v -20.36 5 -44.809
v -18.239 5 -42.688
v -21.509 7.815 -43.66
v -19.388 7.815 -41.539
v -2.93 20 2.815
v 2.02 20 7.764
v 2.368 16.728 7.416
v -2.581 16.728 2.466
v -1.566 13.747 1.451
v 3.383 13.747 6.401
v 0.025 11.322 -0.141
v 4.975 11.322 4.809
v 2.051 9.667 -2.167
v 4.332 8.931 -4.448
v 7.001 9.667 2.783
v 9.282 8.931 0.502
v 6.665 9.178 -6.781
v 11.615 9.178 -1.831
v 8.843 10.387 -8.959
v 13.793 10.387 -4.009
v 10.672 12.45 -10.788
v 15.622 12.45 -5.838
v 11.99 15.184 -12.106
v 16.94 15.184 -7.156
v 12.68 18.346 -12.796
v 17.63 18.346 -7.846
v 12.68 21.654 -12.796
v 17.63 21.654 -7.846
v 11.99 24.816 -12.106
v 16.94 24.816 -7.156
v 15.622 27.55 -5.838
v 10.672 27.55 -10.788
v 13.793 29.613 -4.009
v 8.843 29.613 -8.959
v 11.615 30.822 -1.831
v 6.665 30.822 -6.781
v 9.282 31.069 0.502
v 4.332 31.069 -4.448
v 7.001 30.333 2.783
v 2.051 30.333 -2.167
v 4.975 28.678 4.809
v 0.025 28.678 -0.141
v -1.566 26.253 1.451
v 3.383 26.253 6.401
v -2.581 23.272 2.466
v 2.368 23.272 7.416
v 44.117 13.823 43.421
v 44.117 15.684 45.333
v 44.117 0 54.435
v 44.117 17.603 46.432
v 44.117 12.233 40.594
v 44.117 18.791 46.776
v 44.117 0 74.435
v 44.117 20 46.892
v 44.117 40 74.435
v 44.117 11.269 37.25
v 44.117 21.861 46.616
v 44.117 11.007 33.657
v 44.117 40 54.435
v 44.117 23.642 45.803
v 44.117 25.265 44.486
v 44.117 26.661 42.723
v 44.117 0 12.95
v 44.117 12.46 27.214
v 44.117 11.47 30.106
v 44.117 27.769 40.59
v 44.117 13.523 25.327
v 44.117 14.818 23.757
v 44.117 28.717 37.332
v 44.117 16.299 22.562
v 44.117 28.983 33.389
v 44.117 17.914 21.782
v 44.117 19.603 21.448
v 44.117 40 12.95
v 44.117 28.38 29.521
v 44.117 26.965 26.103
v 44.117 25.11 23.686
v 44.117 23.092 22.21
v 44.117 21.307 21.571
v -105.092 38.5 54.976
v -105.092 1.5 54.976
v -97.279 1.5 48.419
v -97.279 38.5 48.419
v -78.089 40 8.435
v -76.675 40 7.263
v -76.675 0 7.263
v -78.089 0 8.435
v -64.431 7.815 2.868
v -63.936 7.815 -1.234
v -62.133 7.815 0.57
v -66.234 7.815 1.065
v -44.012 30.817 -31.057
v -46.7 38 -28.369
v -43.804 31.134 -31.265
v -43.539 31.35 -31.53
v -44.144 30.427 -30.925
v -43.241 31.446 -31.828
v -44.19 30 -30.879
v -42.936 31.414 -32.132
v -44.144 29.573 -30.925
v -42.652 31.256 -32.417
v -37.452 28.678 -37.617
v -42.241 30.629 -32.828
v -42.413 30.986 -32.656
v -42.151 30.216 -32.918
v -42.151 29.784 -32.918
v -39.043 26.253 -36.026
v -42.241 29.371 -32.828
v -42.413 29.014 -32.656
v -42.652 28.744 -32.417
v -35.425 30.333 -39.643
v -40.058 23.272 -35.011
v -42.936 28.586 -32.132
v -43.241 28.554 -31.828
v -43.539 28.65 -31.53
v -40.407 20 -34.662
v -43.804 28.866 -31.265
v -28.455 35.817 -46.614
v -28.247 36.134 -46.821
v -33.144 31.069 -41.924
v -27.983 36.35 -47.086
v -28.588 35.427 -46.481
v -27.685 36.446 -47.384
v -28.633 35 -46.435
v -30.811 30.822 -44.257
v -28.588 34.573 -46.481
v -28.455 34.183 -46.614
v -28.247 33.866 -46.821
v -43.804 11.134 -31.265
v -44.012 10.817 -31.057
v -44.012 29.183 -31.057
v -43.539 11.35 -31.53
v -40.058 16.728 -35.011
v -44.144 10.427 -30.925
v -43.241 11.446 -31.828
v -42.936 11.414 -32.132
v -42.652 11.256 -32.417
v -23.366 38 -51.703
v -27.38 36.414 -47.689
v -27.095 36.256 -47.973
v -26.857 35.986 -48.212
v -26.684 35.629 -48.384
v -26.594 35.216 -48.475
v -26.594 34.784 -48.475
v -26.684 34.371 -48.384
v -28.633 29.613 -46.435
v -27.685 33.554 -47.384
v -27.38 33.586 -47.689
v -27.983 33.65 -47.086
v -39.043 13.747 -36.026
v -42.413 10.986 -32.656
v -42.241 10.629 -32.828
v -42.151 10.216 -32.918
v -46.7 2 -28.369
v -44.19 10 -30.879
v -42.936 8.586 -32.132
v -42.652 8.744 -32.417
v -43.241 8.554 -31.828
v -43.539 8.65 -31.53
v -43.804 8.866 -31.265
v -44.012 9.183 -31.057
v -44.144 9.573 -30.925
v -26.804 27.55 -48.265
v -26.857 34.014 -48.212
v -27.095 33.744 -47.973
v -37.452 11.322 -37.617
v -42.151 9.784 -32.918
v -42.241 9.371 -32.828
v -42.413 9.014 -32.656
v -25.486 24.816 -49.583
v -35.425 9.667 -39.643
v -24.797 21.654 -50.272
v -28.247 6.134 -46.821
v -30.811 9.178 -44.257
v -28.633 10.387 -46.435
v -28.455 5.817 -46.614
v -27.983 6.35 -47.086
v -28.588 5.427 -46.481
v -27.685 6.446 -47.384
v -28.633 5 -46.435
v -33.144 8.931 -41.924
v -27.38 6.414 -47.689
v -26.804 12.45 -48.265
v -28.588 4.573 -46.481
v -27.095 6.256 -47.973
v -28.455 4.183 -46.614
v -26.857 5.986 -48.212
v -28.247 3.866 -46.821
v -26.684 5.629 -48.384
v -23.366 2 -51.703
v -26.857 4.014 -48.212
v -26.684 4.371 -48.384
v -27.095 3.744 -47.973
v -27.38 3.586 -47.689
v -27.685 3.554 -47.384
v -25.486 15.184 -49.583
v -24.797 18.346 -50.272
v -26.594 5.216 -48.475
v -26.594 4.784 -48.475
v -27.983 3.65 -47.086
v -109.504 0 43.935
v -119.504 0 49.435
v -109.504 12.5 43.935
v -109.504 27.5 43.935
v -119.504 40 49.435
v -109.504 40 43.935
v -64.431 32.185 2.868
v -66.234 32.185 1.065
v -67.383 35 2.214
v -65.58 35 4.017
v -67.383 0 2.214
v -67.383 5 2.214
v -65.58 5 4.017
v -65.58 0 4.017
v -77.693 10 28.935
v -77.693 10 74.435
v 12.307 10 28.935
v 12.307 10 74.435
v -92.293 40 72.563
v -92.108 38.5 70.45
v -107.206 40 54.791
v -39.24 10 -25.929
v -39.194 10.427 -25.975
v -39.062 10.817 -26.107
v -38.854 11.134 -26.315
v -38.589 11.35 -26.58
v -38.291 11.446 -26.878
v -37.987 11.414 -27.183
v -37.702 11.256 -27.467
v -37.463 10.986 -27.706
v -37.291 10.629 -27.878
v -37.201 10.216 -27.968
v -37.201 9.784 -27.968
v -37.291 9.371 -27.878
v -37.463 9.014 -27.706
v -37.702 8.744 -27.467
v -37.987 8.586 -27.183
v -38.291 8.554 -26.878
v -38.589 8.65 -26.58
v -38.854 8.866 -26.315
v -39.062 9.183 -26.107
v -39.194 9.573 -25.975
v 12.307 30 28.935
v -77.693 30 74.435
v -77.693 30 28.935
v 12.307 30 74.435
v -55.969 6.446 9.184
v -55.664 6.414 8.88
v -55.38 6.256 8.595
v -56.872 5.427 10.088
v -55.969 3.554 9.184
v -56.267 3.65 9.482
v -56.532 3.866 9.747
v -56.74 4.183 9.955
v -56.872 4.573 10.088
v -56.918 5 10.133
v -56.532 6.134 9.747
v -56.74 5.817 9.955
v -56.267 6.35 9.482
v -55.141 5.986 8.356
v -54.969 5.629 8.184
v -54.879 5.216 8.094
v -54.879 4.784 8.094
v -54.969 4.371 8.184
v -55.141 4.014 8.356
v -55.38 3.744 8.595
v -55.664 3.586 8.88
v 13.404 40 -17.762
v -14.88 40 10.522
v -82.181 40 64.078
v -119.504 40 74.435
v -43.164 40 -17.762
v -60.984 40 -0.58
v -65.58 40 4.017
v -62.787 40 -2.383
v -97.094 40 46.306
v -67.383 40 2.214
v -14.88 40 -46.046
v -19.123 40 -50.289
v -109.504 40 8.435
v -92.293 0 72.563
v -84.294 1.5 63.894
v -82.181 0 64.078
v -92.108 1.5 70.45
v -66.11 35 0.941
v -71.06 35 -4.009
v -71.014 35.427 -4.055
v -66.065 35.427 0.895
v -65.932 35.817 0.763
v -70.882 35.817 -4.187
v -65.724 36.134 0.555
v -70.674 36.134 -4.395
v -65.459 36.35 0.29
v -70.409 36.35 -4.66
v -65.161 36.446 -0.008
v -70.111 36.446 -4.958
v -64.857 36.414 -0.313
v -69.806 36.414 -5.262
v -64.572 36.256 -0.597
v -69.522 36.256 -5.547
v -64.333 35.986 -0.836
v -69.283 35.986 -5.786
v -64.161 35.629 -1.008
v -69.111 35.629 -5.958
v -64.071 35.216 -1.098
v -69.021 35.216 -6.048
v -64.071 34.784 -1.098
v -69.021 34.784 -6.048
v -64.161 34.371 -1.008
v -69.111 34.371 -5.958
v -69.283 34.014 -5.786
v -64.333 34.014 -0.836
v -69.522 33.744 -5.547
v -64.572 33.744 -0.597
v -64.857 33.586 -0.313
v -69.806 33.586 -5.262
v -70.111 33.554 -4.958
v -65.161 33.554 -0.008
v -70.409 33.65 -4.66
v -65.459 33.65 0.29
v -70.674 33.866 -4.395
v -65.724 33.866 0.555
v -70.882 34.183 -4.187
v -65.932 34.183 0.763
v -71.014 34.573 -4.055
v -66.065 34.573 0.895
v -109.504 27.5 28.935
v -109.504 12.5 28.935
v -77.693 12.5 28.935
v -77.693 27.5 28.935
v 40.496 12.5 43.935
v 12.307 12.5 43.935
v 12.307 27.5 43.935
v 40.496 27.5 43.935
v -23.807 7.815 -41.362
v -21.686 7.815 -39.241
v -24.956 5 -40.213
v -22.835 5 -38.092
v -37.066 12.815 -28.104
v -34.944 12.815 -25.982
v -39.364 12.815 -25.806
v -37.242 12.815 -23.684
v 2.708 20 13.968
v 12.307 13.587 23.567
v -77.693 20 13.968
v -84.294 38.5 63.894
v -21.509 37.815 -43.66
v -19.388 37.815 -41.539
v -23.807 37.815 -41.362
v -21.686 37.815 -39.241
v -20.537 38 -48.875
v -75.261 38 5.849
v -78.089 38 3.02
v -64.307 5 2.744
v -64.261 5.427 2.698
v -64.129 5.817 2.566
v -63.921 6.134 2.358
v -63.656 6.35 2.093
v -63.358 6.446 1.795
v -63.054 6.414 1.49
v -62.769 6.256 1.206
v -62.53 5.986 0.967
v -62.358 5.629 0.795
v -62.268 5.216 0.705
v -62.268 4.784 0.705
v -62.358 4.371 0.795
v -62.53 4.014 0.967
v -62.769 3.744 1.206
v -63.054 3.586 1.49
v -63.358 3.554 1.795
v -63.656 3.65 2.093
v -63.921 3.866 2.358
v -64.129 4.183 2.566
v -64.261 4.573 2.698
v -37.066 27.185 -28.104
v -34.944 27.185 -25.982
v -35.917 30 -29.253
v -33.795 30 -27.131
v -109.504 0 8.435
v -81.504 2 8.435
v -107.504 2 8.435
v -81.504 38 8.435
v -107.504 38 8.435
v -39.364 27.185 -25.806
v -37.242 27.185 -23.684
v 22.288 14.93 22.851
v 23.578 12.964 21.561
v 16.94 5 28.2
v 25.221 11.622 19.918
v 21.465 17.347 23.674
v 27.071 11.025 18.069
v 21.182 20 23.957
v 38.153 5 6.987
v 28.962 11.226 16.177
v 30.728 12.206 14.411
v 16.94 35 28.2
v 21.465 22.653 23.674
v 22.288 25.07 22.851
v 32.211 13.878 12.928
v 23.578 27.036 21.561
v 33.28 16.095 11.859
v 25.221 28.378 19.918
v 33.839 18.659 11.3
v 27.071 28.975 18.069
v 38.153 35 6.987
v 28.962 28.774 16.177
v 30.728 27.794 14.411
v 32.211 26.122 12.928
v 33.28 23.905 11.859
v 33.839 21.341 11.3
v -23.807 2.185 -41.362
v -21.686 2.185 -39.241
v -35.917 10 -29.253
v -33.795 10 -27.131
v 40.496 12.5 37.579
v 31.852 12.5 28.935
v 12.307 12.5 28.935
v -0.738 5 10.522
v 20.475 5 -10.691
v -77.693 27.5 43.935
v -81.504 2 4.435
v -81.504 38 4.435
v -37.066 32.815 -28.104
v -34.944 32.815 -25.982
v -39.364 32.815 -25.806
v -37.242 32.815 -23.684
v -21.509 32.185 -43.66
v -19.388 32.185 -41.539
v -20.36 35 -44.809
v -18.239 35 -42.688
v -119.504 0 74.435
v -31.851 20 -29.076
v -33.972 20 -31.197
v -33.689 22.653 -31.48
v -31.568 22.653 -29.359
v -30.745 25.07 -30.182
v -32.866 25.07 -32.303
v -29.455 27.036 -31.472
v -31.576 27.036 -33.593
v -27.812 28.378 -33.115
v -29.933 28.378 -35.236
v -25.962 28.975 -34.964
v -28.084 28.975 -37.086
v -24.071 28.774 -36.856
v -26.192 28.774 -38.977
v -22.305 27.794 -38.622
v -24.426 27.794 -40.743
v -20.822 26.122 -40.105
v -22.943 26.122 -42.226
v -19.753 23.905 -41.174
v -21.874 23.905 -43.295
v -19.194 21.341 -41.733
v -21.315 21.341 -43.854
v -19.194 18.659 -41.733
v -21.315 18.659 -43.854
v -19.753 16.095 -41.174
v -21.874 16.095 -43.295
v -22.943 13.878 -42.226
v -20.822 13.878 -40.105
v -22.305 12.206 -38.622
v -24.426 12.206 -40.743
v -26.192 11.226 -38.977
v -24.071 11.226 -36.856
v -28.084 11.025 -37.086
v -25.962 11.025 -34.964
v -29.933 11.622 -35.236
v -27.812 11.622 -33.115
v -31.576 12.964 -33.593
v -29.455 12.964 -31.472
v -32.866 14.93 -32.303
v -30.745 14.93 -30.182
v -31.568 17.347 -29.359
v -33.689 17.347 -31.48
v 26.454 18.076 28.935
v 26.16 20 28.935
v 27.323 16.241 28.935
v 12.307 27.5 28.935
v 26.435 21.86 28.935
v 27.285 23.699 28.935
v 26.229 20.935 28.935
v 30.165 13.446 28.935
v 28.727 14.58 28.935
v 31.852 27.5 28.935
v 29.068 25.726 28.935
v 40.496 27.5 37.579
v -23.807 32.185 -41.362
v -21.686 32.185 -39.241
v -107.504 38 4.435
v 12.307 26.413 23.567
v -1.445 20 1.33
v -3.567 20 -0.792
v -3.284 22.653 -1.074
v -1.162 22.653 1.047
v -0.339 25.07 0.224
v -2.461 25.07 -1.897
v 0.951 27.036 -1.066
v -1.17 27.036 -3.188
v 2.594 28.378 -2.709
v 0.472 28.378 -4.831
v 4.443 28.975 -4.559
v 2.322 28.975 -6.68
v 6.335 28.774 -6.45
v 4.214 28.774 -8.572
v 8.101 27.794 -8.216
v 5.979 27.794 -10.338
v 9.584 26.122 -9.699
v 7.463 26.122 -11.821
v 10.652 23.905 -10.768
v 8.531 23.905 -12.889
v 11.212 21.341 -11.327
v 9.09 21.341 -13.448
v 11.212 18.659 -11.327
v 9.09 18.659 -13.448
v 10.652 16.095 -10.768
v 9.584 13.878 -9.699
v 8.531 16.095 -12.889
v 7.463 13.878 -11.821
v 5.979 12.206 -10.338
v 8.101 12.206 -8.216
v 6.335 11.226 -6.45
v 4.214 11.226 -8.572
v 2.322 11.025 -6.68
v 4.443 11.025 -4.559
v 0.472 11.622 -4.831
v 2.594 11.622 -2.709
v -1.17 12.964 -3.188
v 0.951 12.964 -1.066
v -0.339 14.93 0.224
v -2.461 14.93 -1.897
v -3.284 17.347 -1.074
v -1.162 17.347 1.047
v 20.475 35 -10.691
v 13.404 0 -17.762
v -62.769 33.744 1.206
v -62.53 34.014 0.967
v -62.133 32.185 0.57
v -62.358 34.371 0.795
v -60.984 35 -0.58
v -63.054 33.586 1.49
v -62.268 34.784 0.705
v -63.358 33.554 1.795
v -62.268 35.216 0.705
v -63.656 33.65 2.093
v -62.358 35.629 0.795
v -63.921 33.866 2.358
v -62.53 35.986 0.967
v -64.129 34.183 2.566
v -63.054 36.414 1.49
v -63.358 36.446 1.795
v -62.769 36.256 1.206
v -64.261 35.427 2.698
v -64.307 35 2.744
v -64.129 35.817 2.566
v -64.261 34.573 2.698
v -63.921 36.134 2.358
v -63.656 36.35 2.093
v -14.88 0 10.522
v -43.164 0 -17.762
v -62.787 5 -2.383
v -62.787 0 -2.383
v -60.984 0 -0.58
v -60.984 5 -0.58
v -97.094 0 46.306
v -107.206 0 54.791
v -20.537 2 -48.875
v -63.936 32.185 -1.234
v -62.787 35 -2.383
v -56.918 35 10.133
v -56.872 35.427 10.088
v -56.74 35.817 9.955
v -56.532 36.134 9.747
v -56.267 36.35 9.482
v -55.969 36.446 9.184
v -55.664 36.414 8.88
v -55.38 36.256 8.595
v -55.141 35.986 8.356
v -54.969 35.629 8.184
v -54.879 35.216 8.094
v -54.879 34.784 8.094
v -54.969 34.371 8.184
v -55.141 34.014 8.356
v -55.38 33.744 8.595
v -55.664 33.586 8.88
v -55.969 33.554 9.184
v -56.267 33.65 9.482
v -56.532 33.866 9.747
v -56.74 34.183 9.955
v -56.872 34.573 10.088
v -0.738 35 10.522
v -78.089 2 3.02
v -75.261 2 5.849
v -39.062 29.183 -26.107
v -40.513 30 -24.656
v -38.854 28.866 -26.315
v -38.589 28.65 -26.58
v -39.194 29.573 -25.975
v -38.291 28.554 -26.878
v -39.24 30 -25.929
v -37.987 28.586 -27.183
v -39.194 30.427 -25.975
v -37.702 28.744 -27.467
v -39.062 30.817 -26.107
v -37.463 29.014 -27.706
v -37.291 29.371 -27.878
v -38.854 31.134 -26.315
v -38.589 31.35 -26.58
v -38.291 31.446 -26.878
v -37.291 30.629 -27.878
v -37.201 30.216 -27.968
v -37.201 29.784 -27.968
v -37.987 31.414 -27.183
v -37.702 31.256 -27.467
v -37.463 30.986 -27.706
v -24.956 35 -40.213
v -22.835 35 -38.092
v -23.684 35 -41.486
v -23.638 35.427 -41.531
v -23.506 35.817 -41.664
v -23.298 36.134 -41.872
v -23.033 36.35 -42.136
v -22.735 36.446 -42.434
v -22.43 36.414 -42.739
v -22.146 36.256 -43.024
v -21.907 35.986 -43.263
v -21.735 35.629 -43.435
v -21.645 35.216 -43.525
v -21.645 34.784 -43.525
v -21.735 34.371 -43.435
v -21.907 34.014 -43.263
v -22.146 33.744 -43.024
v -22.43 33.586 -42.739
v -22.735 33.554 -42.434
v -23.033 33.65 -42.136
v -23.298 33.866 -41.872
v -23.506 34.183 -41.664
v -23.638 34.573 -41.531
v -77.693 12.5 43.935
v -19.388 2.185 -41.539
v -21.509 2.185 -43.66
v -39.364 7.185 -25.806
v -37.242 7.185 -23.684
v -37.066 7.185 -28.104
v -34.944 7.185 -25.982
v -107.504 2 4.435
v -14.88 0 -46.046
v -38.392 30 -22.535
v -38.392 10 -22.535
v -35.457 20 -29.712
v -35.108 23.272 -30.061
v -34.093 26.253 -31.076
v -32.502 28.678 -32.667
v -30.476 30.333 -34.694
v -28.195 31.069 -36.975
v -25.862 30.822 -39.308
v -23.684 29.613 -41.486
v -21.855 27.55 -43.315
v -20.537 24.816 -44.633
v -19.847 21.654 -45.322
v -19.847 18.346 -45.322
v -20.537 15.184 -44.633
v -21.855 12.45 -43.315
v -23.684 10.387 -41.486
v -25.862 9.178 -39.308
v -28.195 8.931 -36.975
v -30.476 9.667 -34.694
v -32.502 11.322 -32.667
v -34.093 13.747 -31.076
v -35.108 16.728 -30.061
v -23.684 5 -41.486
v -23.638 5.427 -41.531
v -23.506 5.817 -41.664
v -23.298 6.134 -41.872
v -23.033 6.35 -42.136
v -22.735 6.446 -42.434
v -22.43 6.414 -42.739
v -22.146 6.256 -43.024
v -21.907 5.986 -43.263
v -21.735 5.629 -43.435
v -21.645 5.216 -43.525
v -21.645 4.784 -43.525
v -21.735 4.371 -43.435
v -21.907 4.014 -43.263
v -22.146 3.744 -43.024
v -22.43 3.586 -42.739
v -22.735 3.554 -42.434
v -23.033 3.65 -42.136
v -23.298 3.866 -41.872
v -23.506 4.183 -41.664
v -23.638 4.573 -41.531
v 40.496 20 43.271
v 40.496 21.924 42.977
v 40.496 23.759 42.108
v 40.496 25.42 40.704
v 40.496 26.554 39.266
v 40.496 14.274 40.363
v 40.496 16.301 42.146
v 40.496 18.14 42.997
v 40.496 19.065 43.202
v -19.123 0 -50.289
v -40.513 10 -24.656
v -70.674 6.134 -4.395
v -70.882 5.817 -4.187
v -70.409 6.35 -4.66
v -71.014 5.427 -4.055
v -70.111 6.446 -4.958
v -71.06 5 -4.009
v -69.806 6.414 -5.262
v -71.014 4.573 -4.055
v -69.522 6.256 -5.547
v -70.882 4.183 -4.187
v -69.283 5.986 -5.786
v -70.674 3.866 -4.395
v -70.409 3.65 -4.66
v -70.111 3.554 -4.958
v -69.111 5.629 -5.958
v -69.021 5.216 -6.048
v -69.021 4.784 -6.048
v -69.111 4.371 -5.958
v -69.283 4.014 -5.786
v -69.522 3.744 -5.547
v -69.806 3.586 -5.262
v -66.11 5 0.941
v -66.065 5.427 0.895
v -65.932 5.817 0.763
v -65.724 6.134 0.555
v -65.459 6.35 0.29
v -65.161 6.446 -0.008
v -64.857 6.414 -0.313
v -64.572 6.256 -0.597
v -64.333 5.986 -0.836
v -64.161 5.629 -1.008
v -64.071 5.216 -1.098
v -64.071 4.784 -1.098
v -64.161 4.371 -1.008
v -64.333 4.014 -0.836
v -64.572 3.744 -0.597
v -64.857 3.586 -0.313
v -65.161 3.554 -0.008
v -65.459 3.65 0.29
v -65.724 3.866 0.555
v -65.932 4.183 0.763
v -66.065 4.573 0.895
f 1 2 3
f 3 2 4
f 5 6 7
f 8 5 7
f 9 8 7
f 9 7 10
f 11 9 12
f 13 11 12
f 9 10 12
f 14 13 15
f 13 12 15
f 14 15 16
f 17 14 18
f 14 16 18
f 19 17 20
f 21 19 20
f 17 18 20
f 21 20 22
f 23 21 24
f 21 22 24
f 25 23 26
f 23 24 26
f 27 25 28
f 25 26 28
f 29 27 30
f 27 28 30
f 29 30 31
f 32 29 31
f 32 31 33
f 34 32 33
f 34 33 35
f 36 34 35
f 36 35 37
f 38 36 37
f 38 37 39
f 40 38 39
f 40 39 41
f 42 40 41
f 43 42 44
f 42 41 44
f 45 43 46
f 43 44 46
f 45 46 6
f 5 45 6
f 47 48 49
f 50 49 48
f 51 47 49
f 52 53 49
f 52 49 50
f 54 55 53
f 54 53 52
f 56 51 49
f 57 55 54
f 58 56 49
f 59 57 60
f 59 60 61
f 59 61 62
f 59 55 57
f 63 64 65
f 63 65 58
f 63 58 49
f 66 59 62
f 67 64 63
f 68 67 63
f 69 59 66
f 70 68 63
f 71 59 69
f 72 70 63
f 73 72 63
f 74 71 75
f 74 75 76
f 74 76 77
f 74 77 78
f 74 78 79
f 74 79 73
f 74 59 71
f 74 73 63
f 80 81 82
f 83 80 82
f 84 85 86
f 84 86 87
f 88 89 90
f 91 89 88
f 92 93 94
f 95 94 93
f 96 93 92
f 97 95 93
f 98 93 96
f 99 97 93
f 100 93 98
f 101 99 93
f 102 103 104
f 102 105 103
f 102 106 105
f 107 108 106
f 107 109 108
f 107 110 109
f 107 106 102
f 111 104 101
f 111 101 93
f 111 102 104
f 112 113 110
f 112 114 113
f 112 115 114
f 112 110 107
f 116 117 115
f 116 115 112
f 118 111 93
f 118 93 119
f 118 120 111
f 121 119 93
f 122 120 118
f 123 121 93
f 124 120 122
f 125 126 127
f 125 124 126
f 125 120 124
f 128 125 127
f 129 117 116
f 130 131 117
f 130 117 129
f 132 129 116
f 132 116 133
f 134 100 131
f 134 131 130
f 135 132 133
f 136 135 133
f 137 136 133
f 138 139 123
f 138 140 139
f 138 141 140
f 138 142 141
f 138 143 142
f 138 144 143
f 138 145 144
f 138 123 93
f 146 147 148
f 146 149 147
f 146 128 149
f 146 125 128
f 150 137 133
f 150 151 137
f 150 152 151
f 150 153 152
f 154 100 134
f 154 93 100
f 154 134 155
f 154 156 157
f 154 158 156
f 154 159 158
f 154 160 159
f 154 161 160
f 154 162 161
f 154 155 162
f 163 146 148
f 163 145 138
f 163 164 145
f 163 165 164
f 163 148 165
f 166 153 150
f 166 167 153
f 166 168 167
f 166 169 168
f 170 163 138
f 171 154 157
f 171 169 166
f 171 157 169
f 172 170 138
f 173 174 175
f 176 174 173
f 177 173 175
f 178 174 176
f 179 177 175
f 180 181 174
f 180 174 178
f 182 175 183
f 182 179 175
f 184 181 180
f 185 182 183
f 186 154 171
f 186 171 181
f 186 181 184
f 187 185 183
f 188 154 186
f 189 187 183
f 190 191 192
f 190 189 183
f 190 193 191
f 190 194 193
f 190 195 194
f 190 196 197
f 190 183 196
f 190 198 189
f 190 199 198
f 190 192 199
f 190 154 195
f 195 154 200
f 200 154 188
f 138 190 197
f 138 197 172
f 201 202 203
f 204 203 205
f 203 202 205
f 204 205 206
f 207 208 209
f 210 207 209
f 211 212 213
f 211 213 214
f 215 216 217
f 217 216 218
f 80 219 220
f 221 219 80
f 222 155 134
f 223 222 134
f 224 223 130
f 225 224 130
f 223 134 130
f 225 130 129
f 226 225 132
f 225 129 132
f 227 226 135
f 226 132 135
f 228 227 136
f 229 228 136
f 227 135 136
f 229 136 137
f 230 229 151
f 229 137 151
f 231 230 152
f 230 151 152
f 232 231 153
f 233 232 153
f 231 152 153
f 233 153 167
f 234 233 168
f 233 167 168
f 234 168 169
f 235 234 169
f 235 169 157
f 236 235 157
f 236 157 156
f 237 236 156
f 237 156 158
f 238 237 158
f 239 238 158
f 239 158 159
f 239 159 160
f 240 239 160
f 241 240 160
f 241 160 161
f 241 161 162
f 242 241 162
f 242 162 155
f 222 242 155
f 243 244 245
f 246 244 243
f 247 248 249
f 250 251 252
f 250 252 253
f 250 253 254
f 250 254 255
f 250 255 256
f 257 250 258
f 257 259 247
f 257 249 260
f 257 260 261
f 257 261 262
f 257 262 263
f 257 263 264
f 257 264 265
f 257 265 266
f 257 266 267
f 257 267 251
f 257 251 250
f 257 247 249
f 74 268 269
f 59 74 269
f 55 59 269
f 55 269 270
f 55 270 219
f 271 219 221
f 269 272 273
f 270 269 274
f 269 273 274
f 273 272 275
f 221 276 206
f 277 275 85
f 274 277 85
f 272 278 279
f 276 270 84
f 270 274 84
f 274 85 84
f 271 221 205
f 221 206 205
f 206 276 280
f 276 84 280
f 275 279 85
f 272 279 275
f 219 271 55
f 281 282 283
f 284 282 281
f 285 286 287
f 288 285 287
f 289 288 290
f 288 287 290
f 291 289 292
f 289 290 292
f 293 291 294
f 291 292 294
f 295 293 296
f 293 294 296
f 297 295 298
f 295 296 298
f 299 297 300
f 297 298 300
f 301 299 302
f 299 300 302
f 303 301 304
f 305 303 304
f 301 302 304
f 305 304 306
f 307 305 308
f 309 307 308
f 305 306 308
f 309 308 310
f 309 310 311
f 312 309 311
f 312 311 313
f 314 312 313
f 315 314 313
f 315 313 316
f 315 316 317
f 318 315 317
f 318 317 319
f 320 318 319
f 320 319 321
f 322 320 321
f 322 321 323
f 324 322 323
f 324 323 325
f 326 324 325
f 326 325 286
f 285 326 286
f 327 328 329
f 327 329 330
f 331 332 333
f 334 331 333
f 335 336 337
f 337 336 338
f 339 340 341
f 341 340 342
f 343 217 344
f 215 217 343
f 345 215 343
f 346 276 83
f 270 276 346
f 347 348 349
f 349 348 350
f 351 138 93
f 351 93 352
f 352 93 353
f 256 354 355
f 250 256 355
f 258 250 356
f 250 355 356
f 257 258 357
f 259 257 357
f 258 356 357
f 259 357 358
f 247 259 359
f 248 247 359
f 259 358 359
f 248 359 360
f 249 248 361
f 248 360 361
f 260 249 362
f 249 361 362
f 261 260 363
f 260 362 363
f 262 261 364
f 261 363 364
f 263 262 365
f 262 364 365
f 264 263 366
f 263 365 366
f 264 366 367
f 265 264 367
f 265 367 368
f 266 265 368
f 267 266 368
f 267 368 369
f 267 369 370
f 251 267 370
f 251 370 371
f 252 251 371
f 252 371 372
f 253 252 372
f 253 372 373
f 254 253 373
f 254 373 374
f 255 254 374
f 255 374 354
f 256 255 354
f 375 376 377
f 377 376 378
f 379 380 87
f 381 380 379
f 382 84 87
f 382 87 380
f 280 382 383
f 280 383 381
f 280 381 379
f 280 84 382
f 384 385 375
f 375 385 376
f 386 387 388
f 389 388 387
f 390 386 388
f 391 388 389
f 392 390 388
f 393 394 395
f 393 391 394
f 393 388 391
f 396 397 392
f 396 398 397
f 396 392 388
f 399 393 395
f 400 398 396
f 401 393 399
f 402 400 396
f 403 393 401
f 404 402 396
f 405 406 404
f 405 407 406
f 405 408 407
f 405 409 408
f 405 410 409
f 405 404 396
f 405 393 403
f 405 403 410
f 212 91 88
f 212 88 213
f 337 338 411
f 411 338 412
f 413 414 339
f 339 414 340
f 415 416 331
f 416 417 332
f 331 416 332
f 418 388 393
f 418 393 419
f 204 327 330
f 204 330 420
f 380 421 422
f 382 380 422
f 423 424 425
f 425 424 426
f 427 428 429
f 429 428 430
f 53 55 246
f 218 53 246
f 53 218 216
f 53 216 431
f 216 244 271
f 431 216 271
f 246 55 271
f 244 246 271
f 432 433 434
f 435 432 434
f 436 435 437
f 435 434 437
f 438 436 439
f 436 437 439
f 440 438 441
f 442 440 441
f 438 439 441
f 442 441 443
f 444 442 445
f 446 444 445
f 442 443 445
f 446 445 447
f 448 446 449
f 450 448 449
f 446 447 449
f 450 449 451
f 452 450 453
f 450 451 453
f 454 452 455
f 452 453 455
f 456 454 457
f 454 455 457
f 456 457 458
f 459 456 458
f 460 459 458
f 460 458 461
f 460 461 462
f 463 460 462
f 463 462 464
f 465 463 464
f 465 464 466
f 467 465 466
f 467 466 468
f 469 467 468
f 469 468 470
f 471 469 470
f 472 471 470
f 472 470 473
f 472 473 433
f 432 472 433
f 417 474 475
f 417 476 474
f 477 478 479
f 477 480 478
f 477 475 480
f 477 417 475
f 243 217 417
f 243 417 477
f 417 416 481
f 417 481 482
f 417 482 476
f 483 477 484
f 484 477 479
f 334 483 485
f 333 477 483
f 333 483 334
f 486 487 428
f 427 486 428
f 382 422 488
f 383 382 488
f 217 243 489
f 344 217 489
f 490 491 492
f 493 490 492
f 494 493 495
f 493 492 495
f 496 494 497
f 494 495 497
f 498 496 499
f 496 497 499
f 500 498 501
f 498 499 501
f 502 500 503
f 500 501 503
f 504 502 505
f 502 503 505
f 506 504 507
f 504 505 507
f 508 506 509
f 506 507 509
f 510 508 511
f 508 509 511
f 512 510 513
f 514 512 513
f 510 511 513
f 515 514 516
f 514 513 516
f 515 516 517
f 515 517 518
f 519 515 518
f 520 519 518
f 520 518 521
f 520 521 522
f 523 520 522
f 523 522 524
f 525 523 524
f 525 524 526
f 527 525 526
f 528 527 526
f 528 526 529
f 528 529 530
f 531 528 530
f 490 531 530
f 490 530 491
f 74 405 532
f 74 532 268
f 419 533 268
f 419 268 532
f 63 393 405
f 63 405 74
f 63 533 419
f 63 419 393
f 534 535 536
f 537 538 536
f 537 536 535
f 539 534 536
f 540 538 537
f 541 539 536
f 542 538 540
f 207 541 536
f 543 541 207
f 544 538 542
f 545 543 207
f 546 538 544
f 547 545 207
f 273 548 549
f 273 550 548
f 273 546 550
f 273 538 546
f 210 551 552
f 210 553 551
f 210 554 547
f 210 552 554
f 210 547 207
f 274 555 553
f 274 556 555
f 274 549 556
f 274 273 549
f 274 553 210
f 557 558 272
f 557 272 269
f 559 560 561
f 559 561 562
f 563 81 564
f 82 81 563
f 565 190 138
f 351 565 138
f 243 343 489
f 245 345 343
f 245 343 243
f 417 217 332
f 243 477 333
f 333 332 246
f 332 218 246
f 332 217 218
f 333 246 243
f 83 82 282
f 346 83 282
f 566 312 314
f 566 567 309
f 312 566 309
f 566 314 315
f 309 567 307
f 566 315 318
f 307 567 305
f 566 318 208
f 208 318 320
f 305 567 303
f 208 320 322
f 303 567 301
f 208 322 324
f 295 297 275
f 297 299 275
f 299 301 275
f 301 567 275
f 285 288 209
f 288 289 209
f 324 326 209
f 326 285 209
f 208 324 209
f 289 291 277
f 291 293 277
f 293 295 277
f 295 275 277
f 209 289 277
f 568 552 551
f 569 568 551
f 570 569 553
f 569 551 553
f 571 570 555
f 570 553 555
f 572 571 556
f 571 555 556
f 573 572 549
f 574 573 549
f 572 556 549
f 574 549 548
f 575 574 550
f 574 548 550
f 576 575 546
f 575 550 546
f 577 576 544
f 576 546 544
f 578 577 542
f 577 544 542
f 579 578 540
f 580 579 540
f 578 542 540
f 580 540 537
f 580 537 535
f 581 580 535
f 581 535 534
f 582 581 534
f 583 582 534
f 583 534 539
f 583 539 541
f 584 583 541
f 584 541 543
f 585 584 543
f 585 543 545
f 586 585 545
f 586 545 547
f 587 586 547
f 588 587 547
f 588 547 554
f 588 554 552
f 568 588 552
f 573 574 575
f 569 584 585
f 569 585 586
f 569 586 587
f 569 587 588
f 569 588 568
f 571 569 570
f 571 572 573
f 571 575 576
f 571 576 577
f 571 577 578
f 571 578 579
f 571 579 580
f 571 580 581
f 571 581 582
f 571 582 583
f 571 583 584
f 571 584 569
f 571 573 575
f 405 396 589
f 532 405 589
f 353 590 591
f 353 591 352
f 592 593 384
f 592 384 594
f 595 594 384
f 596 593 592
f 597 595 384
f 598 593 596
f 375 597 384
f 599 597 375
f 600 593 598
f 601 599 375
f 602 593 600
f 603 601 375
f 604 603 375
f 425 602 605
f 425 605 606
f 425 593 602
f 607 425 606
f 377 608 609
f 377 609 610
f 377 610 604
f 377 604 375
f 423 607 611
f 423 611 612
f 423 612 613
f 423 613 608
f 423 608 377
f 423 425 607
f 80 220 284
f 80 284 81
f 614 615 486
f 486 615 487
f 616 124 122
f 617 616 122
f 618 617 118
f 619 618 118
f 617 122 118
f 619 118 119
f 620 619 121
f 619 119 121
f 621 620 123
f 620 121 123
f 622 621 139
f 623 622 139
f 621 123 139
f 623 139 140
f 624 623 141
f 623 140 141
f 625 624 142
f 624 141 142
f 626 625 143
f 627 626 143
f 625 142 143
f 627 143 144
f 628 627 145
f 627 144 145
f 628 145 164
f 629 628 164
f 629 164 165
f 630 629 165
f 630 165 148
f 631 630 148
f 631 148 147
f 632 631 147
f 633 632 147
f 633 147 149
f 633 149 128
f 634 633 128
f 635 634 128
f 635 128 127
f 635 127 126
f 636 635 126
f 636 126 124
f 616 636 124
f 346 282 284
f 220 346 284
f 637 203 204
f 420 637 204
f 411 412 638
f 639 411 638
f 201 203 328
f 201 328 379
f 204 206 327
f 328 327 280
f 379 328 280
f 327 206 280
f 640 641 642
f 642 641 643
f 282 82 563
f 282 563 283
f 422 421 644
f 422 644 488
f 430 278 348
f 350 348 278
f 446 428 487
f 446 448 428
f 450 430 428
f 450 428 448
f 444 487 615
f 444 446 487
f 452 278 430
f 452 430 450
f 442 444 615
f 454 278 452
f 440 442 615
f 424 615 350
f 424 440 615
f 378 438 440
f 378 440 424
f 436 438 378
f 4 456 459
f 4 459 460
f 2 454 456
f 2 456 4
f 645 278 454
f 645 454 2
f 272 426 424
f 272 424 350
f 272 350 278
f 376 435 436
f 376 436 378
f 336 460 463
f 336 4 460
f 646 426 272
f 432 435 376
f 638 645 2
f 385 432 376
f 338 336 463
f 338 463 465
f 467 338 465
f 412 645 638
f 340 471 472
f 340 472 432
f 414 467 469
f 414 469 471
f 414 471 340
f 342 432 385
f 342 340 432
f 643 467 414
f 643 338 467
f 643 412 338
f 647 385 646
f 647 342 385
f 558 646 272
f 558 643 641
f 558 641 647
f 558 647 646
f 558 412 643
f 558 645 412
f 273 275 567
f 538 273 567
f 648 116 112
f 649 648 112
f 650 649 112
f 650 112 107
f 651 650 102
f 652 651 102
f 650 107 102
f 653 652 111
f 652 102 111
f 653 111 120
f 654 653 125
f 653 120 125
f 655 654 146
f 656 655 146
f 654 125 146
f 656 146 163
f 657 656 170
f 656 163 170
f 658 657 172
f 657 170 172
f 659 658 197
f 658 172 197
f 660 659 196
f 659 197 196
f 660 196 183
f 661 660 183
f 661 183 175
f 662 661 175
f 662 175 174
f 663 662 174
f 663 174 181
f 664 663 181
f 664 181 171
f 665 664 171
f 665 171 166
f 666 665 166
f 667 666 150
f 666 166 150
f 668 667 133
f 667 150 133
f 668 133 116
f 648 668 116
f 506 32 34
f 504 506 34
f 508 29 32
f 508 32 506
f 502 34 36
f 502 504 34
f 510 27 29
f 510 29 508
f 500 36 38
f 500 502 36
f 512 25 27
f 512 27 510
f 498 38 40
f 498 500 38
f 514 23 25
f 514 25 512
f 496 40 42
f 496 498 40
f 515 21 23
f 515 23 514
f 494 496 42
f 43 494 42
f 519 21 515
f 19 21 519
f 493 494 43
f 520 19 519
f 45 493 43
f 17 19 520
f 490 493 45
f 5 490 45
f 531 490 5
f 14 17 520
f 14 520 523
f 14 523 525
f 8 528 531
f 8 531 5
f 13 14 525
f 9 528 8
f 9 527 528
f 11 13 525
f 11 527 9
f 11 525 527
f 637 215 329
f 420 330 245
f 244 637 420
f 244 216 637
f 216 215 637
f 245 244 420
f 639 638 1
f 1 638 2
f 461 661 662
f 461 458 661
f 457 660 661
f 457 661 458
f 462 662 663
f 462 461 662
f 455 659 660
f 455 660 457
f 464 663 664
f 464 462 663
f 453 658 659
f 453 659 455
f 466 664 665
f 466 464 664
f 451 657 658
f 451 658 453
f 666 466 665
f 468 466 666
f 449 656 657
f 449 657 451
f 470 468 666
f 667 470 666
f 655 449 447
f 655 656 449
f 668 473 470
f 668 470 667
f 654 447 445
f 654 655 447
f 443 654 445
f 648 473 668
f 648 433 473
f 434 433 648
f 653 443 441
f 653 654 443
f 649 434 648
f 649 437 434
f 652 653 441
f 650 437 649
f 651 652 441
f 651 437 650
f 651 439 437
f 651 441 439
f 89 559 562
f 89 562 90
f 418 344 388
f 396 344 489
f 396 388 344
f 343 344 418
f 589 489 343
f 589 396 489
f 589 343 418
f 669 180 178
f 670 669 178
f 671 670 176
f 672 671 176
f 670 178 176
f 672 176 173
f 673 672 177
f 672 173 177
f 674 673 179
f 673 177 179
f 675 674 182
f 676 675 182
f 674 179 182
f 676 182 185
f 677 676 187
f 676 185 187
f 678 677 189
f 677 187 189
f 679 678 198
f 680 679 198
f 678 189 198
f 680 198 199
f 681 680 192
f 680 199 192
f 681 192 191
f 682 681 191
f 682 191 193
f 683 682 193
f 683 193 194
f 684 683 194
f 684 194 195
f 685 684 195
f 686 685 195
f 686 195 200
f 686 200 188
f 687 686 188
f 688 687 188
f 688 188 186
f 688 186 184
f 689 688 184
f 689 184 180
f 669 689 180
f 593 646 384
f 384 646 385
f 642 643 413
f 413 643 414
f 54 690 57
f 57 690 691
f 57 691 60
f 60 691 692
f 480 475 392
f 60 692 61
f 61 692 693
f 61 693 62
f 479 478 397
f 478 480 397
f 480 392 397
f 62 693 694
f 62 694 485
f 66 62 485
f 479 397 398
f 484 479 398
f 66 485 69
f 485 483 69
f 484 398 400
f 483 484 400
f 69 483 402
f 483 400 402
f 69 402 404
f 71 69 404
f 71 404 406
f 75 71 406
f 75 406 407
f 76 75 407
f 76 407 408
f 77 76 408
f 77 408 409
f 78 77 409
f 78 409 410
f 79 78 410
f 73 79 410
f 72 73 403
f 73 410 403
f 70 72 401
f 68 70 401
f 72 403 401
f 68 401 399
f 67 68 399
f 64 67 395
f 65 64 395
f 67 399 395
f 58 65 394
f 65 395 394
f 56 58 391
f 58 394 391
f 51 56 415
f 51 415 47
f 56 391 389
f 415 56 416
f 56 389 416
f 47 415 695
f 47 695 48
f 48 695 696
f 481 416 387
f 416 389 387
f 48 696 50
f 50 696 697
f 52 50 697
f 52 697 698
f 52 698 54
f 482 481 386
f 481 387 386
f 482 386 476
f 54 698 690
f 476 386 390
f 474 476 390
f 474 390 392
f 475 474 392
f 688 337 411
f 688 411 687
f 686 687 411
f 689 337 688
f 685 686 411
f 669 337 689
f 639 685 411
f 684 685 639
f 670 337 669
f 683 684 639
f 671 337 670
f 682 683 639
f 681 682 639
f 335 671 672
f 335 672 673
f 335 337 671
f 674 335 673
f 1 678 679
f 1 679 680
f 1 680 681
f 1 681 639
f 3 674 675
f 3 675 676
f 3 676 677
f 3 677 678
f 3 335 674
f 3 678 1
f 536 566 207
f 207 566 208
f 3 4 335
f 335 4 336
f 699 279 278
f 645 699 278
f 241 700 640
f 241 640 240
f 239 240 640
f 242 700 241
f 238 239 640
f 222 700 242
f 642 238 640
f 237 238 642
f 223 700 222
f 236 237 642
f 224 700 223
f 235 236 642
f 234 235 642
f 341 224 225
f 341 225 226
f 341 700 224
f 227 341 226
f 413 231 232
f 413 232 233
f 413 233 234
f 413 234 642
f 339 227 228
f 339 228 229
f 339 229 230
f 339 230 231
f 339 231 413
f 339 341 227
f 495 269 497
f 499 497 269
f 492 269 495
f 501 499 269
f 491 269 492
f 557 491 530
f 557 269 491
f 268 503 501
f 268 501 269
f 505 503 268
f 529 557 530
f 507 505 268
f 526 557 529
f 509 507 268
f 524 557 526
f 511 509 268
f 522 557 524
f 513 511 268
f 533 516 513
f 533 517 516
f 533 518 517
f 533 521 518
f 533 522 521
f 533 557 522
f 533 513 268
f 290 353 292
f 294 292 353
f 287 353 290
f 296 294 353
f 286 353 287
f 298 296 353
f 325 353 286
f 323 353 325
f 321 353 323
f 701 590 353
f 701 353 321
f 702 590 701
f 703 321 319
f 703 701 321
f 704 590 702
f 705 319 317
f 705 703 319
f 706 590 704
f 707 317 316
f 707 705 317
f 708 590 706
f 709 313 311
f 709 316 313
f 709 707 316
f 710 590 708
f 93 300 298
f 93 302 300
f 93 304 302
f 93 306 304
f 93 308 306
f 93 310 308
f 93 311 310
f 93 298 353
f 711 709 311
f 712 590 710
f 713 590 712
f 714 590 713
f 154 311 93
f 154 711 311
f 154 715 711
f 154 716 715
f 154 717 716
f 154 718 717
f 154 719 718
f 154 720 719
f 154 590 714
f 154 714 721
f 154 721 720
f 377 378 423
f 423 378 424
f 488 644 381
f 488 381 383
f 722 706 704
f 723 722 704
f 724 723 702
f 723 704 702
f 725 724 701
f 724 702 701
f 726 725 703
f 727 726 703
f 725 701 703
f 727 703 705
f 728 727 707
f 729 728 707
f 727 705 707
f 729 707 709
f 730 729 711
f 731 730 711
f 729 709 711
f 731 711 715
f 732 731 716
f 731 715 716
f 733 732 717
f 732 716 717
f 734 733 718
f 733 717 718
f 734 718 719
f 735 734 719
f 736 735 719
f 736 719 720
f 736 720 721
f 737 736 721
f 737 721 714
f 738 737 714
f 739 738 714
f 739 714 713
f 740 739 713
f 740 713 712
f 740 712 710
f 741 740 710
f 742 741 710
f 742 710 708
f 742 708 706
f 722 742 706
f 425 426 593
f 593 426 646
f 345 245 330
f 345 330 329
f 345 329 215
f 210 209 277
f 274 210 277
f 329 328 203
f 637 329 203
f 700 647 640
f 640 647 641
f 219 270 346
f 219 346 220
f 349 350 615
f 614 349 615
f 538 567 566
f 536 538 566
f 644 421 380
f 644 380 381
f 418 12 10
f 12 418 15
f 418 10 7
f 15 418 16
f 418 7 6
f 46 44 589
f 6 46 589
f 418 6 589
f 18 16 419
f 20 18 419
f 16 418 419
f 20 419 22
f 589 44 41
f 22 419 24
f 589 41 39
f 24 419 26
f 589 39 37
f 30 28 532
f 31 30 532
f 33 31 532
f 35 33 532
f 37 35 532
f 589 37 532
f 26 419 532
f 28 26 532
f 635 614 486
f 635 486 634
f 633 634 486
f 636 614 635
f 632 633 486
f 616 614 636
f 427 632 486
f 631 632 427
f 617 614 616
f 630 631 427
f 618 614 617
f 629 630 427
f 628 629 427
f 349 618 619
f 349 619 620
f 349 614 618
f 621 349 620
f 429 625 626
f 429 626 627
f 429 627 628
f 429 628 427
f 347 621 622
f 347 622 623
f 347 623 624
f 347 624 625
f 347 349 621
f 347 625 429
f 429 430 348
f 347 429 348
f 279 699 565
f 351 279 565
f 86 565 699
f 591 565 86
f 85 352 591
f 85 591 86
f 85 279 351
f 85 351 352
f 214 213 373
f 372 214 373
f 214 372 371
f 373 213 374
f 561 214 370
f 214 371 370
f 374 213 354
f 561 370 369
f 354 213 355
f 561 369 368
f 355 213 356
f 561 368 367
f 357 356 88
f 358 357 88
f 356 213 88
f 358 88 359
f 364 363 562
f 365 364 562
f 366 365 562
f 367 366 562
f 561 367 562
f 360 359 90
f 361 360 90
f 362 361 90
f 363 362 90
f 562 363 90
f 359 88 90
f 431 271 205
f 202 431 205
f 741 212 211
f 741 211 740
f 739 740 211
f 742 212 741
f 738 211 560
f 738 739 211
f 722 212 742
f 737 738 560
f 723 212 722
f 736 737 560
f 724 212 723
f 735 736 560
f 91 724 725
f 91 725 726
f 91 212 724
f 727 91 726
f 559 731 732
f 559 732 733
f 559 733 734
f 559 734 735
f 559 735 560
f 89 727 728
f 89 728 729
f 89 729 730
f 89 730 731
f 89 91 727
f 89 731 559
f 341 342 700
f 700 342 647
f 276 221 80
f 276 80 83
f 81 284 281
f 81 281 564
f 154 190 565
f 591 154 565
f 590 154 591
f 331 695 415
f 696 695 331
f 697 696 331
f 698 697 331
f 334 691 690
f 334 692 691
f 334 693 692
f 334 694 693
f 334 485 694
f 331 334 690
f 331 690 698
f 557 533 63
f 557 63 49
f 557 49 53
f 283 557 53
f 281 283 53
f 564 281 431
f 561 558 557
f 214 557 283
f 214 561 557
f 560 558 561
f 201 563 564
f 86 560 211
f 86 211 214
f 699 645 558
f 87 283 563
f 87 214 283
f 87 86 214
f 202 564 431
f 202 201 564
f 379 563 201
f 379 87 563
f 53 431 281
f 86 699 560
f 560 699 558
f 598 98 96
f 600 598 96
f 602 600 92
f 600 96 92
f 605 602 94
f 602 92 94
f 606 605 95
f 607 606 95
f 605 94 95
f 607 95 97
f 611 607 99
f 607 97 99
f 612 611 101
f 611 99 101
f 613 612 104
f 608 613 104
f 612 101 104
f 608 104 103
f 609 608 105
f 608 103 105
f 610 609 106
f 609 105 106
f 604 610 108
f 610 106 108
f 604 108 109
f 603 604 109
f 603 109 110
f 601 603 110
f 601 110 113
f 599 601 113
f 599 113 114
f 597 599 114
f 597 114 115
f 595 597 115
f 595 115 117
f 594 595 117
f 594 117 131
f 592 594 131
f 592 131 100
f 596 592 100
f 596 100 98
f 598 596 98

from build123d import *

# Parameters (mm, degrees)
BOSS_EXTRUDE1_DEPTH  = 40
SKETCH3_R            = 9
CUT_EXTRUDE1_DEPTH   = 135.350288425
SKETCH4_W            = 25
SKETCH4_H            = 30
CUT_EXTRUDE2_DEPTH   = 30
SKETCH5_R            = 11.1
CUT_EXTRUDE3_DEPTH   = 7
SKETCH6_R            = 11.1
CUT_EXTRUDE4_DEPTH   = 7
CUT_EXTRUDE5_DEPTH   = 41
SKETCH9_W            = 50
SKETCH9_H            = 40
BOSS_EXTRUDE2_DEPTH  = 30
SKETCH11_R           = 1.45
CUT_EXTRUDE8_DEPTH   = 20
SKETCH15_W           = 81.391173049
SKETCH15_H           = 40
SKETCH15_W_2         = 77.391173049
SKETCH15_H_2         = 36
CUT_EXTRUDE9_DEPTH   = 4
SKETCH16_W           = 30
SKETCH16_H           = 40
SKETCH16_W_2         = 26
SKETCH16_H_2         = 36
CUT_EXTRUDE10_DEPTH  = 4
CUT_EXTRUDE11_DEPTH  = 41
SKETCH18_W           = 153.620263659
SKETCH18_H           = 20
BOSS_EXTRUDE3_DEPTH  = 40
CUT_EXTRUDE7_DEPTH   = 41
SKETCH19_W           = 15
SKETCH19_H           = 15
CUT_EXTRUDE12_DEPTH  = 150
SKETCH20_R           = 1.45
CUT_EXTRUDE13_DEPTH  = 20
CUT_EXTRUDE16_DEPTH  = 3
CUT_EXTRUDE18_START  = -7
CUT_EXTRUDE18_DEPTH  = 2.55
SKETCH38_W           = 90
SKETCH38_H           = 20
CUT_EXTRUDE19_DEPTH  = 45.5
CUT_EXTRUDE21_START  = -31.810131
CUT_EXTRUDE21_DEPTH  = 90
BOSS_EXTRUDE11_DEPTH = 40
CHAMFER1_SIZE        = 1.5


with BuildPart() as part:
    # Sketch1 → Boss-Extrude1 (new body)
    with BuildSketch(Plane(origin=(0, 0, 0), x_dir=(1, 0, 0), z_dir=(0, 1, 0))):
        Polygon((-79.503540842, -54.434705768), (-79.503540842, -4.434705768), (-46.700027791, 28.368807283), (-21.951290449, 53.117544624), (-14.880222638, 46.046476813), (-43.164493885, 17.762205565), (-14.880222638, -10.522065682), (13.40404861, 17.762205565), (60.496459158, -29.330204983), (60.496459158, -54.434705768), align=None)
    extrude(amount=BOSS_EXTRUDE1_DEPTH)

    # Sketch3 → Cut-Extrude1 (cut, through all)
    with BuildSketch(Plane(origin=(-37.534417537, 0, -37.534417537), x_dir=(-0.707106781, 0, 0.707106781), z_dir=(-0.707106781, 0, -0.707106781))):
        with Locations((-7.037869671, 20)):
            Circle(SKETCH3_R)
    extrude(amount=-CUT_EXTRUDE1_DEPTH, mode=Mode.SUBTRACT)

    # Sketch4 → Cut-Extrude2 (cut)
    with BuildSketch(Plane(origin=(15.583127088, 0, -15.583127088), x_dir=(-0.707106781, 0, -0.707106781), z_dir=(0.707106781, 0, -0.707106781))):
        with Locations((-19.418317664, 20)):
            Rectangle(SKETCH4_W, SKETCH4_H)
    extrude(amount=-CUT_EXTRUDE2_DEPTH, mode=Mode.SUBTRACT)

    # Sketch5 → Cut-Extrude3 (cut)
    with BuildSketch(Plane(origin=(-37.534417537, 0, -37.534417537), x_dir=(-0.707106781, 0, 0.707106781), z_dir=(-0.707106781, 0, -0.707106781))):
        with Locations((-7.037869671, 20)):
            Circle(SKETCH5_R)
    extrude(amount=-CUT_EXTRUDE3_DEPTH, mode=Mode.SUBTRACT)

    # Sketch6 → Cut-Extrude4 (cut)
    with BuildSketch(Plane(origin=(4.891989334, 0, 4.891989334), x_dir=(0.707106781, 0, -0.707106781), z_dir=(0.707106781, 0, 0.707106781))):
        with Locations(Location((7.037869671, 20, 0), (0, 0, 180))):  # turned: the seam where the file's is
            Circle(SKETCH6_R)
    extrude(amount=-CUT_EXTRUDE4_DEPTH, mode=Mode.SUBTRACT)

    # Sketch7 → Cut-Extrude5 (cut, through all)
    with BuildSketch(Plane(origin=(0, 40, 0), x_dir=(1, 0, 0), z_dir=(0, 1, 0))):
        Polygon((44.116722817, -12.950468642), (44.116722817, -54.434705768), (60.496459158, -54.434705768), (60.496459158, -29.330204983), align=None)
    extrude(amount=-CUT_EXTRUDE5_DEPTH, mode=Mode.SUBTRACT)

    # Sketch9 → Boss-Extrude2 (add)
    with BuildSketch(Plane.ZY.offset(79.503540842)):
        with Locations((29.434705768, 20)):
            Rectangle(SKETCH9_W, SKETCH9_H)
    extrude(amount=BOSS_EXTRUDE2_DEPTH)

    # Sketch11 → Cut-Extrude8 (cut)
    with BuildSketch(Plane(origin=(-37.534417537, 0, -37.534417537), x_dir=(-0.707106781, 0, 0.707106781), z_dir=(-0.707106781, 0, -0.707106781))):
        with Locations((7.962130329, 10)):
            Circle(SKETCH11_R)
        with Locations((7.962130329, 30)):
            Circle(SKETCH11_R)
    extrude(amount=-CUT_EXTRUDE8_DEPTH, mode=Mode.SUBTRACT)

    # Sketch15 → Cut-Extrude9 (cut)
    with BuildSketch(Plane(origin=(-37.534417537, 0, -37.534417537), x_dir=(-0.707106781, 0, 0.707106781), z_dir=(-0.707106781, 0, -0.707106781))):
        with Locations((18.657716854, 20)):
            Rectangle(SKETCH15_W, SKETCH15_H)
        with Locations((18.657716854, 20)):
            Rectangle(SKETCH15_W_2, SKETCH15_H_2, mode=Mode.SUBTRACT)
    extrude(amount=-CUT_EXTRUDE9_DEPTH, mode=Mode.SUBTRACT)

    # Sketch16 → Cut-Extrude10 (cut)
    with BuildSketch(Plane(origin=(0, 0, 4.434705768), x_dir=(-1, 0, 0), z_dir=(0, 0, -1))):
        with Locations((94.503540842, 20)):
            Rectangle(SKETCH16_W, SKETCH16_H)
        with Locations((94.503540842, 20)):
            Rectangle(SKETCH16_W_2, SKETCH16_H_2, mode=Mode.SUBTRACT)
    extrude(amount=-CUT_EXTRUDE10_DEPTH, mode=Mode.SUBTRACT)

    # Sketch17 → Cut-Extrude11 (cut, through all)
    with BuildSketch(Plane.XZ):
        Polygon((-76.675113717, 7.263132892), (-78.089327279, 8.434705768), (-79.503540842, 8.434705768), (-79.503540842, 4.434705768), align=None)
    extrude(amount=-CUT_EXTRUDE11_DEPTH, mode=Mode.SUBTRACT)

    # Sketch18 → Boss-Extrude3 (add)
    with BuildSketch(Plane(origin=(0, 40, 0), x_dir=(1, 0, 0), z_dir=(0, 1, 0))):
        with Locations((-32.693409012, -64.434705768)):
            Rectangle(SKETCH18_W, SKETCH18_H)
    extrude(amount=-BOSS_EXTRUDE3_DEPTH)

    # Sketch10 → Cut-Extrude7 (cut, through all)
    with BuildSketch(Plane(origin=(0, 40, 0), x_dir=(1, 0, 0), z_dir=(0, 1, 0))):
        Polygon((-92.108080814, -70.449971453), (-105.09239053, -54.975873702), (-97.27873721, -48.419440083), (-84.294427494, -63.893537834), align=None)
    extrude(amount=-CUT_EXTRUDE7_DEPTH, mode=Mode.SUBTRACT)

    # Sketch19 → Cut-Extrude12 (cut)
    with BuildSketch(Plane.ZY.offset(109.503540842)):
        with Locations((36.434705768, 20)):
            Rectangle(SKETCH19_W, SKETCH19_H)
    extrude(amount=-CUT_EXTRUDE12_DEPTH, mode=Mode.SUBTRACT)

    # Sketch20 → Cut-Extrude13 (cut)
    with BuildSketch(Plane(origin=(-37.534417537, 0, -37.534417537), x_dir=(-0.707106781, 0, 0.707106781), z_dir=(-0.707106781, 0, -0.707106781))):
        with Locations((45.962130329, 5)):
            Circle(SKETCH20_R)
        with Locations((45.962130329, 35)):
            Circle(SKETCH20_R)
        with Locations((-14.037869671, 35)):
            Circle(SKETCH20_R)
        with Locations((-14.037869671, 5)):
            Circle(SKETCH20_R)
    extrude(amount=-CUT_EXTRUDE13_DEPTH, mode=Mode.SUBTRACT)

    # Sketch36 → Cut-Extrude16 (cut)
    with BuildSketch(Plane(origin=(-30.463349725, 0, -30.463349725), x_dir=(0.707106781, 0, -0.707106781), z_dir=(0.707106781, 0, 0.707106781))):
        Polygon((12.412869671, 37.814582562), (10.787869671, 35), (12.412869671, 32.185417438), (15.662869671, 32.185417438), (17.287869671, 35), (15.662869671, 37.814582562), align=None)
        Polygon((15.662869671, 7.814582562), (12.412869671, 7.814582562), (10.787869671, 5), (12.412869671, 2.185417438), (15.662869671, 2.185417438), (17.287869671, 5), align=None)
        Polygon((-6.337130329, 32.814582562), (-9.587130329, 32.814582562), (-11.212130329, 30), (-9.587130329, 27.185417438), (-6.337130329, 27.185417438), (-4.712130329, 30), align=None)
        Polygon((-6.337130329, 12.814582562), (-9.587130329, 12.814582562), (-11.212130329, 10), (-9.587130329, 7.185417438), (-6.337130329, 7.185417438), (-4.712130329, 10), align=None)
    extrude(amount=-CUT_EXTRUDE16_DEPTH, mode=Mode.SUBTRACT)

    # Sketch37 → Cut-Extrude18 (cut)
    with BuildSketch(Plane(origin=(-37.534417537, 0, -37.534417537), x_dir=(-0.707106781, 0, 0.707106781), z_dir=(-0.707106781, 0, -0.707106781)).offset(CUT_EXTRUDE18_START)):
        Polygon((49.212130329, 5), (49.212130329, 0), (42.712130329, 0), (42.712130329, 5), (44.337130329, 7.814582562), (47.587130329, 7.814582562), align=None)
        Polygon((42.712130329, 35), (44.337130329, 32.185417438), (47.587130329, 32.185417438), (49.212130329, 35), (49.212130329, 40), (42.712130329, 40), align=None)
    extrude(amount=-CUT_EXTRUDE18_DEPTH, mode=Mode.SUBTRACT)

    # Sketch38 → Cut-Extrude19 (cut)
    with BuildSketch(Plane.XY.offset(74.434705768)):
        with Locations((-32.693409012, 20)):
            Rectangle(SKETCH38_W, SKETCH38_H)
    extrude(amount=-CUT_EXTRUDE19_DEPTH, mode=Mode.SUBTRACT)

    # Sketch39 → Cut-Extrude21 (cut)
    with BuildSketch(Plane.ZY.offset(109.503540842).offset(CUT_EXTRUDE21_START)):
        Polygon((28.934705768, 10), (13.968076221, 20), (28.934705768, 30), align=None)
    extrude(amount=-CUT_EXTRUDE21_DEPTH, mode=Mode.SUBTRACT)

    # Sketch42 → Boss-Extrude11 (add)
    with BuildSketch(Plane(origin=(0, 40, 0), x_dir=(1, 0, 0), z_dir=(0, 1, 0))):
        Polygon((-109.503540842, -43.934705768), (-109.503540842, -74.434705768), (-119.503540842, -74.434705768), (-119.503540842, -49.434705768), align=None)
    extrude(amount=-BOSS_EXTRUDE11_DEPTH)

    # Chamfer1
    chamfer1_edges = [part.edges().sort_by_distance(p)[0] for p in [
        (-88.201254154, 0, 67.171754643),
        (-98.600235672, 0, 62.712922577),
        (-101.18556387, 0, 51.697656892),
        (-90.786582352, 0, 56.156488958),
        (-88.201254154, 40, 67.171754643),
        (-90.786582352, 40, 56.156488958),
        (-101.18556387, 40, 51.697656892),
        (-98.600235672, 40, 62.712922577),
    ]]
    chamfer(chamfer1_edges, length=CHAMFER1_SIZE)


solid = part.part
